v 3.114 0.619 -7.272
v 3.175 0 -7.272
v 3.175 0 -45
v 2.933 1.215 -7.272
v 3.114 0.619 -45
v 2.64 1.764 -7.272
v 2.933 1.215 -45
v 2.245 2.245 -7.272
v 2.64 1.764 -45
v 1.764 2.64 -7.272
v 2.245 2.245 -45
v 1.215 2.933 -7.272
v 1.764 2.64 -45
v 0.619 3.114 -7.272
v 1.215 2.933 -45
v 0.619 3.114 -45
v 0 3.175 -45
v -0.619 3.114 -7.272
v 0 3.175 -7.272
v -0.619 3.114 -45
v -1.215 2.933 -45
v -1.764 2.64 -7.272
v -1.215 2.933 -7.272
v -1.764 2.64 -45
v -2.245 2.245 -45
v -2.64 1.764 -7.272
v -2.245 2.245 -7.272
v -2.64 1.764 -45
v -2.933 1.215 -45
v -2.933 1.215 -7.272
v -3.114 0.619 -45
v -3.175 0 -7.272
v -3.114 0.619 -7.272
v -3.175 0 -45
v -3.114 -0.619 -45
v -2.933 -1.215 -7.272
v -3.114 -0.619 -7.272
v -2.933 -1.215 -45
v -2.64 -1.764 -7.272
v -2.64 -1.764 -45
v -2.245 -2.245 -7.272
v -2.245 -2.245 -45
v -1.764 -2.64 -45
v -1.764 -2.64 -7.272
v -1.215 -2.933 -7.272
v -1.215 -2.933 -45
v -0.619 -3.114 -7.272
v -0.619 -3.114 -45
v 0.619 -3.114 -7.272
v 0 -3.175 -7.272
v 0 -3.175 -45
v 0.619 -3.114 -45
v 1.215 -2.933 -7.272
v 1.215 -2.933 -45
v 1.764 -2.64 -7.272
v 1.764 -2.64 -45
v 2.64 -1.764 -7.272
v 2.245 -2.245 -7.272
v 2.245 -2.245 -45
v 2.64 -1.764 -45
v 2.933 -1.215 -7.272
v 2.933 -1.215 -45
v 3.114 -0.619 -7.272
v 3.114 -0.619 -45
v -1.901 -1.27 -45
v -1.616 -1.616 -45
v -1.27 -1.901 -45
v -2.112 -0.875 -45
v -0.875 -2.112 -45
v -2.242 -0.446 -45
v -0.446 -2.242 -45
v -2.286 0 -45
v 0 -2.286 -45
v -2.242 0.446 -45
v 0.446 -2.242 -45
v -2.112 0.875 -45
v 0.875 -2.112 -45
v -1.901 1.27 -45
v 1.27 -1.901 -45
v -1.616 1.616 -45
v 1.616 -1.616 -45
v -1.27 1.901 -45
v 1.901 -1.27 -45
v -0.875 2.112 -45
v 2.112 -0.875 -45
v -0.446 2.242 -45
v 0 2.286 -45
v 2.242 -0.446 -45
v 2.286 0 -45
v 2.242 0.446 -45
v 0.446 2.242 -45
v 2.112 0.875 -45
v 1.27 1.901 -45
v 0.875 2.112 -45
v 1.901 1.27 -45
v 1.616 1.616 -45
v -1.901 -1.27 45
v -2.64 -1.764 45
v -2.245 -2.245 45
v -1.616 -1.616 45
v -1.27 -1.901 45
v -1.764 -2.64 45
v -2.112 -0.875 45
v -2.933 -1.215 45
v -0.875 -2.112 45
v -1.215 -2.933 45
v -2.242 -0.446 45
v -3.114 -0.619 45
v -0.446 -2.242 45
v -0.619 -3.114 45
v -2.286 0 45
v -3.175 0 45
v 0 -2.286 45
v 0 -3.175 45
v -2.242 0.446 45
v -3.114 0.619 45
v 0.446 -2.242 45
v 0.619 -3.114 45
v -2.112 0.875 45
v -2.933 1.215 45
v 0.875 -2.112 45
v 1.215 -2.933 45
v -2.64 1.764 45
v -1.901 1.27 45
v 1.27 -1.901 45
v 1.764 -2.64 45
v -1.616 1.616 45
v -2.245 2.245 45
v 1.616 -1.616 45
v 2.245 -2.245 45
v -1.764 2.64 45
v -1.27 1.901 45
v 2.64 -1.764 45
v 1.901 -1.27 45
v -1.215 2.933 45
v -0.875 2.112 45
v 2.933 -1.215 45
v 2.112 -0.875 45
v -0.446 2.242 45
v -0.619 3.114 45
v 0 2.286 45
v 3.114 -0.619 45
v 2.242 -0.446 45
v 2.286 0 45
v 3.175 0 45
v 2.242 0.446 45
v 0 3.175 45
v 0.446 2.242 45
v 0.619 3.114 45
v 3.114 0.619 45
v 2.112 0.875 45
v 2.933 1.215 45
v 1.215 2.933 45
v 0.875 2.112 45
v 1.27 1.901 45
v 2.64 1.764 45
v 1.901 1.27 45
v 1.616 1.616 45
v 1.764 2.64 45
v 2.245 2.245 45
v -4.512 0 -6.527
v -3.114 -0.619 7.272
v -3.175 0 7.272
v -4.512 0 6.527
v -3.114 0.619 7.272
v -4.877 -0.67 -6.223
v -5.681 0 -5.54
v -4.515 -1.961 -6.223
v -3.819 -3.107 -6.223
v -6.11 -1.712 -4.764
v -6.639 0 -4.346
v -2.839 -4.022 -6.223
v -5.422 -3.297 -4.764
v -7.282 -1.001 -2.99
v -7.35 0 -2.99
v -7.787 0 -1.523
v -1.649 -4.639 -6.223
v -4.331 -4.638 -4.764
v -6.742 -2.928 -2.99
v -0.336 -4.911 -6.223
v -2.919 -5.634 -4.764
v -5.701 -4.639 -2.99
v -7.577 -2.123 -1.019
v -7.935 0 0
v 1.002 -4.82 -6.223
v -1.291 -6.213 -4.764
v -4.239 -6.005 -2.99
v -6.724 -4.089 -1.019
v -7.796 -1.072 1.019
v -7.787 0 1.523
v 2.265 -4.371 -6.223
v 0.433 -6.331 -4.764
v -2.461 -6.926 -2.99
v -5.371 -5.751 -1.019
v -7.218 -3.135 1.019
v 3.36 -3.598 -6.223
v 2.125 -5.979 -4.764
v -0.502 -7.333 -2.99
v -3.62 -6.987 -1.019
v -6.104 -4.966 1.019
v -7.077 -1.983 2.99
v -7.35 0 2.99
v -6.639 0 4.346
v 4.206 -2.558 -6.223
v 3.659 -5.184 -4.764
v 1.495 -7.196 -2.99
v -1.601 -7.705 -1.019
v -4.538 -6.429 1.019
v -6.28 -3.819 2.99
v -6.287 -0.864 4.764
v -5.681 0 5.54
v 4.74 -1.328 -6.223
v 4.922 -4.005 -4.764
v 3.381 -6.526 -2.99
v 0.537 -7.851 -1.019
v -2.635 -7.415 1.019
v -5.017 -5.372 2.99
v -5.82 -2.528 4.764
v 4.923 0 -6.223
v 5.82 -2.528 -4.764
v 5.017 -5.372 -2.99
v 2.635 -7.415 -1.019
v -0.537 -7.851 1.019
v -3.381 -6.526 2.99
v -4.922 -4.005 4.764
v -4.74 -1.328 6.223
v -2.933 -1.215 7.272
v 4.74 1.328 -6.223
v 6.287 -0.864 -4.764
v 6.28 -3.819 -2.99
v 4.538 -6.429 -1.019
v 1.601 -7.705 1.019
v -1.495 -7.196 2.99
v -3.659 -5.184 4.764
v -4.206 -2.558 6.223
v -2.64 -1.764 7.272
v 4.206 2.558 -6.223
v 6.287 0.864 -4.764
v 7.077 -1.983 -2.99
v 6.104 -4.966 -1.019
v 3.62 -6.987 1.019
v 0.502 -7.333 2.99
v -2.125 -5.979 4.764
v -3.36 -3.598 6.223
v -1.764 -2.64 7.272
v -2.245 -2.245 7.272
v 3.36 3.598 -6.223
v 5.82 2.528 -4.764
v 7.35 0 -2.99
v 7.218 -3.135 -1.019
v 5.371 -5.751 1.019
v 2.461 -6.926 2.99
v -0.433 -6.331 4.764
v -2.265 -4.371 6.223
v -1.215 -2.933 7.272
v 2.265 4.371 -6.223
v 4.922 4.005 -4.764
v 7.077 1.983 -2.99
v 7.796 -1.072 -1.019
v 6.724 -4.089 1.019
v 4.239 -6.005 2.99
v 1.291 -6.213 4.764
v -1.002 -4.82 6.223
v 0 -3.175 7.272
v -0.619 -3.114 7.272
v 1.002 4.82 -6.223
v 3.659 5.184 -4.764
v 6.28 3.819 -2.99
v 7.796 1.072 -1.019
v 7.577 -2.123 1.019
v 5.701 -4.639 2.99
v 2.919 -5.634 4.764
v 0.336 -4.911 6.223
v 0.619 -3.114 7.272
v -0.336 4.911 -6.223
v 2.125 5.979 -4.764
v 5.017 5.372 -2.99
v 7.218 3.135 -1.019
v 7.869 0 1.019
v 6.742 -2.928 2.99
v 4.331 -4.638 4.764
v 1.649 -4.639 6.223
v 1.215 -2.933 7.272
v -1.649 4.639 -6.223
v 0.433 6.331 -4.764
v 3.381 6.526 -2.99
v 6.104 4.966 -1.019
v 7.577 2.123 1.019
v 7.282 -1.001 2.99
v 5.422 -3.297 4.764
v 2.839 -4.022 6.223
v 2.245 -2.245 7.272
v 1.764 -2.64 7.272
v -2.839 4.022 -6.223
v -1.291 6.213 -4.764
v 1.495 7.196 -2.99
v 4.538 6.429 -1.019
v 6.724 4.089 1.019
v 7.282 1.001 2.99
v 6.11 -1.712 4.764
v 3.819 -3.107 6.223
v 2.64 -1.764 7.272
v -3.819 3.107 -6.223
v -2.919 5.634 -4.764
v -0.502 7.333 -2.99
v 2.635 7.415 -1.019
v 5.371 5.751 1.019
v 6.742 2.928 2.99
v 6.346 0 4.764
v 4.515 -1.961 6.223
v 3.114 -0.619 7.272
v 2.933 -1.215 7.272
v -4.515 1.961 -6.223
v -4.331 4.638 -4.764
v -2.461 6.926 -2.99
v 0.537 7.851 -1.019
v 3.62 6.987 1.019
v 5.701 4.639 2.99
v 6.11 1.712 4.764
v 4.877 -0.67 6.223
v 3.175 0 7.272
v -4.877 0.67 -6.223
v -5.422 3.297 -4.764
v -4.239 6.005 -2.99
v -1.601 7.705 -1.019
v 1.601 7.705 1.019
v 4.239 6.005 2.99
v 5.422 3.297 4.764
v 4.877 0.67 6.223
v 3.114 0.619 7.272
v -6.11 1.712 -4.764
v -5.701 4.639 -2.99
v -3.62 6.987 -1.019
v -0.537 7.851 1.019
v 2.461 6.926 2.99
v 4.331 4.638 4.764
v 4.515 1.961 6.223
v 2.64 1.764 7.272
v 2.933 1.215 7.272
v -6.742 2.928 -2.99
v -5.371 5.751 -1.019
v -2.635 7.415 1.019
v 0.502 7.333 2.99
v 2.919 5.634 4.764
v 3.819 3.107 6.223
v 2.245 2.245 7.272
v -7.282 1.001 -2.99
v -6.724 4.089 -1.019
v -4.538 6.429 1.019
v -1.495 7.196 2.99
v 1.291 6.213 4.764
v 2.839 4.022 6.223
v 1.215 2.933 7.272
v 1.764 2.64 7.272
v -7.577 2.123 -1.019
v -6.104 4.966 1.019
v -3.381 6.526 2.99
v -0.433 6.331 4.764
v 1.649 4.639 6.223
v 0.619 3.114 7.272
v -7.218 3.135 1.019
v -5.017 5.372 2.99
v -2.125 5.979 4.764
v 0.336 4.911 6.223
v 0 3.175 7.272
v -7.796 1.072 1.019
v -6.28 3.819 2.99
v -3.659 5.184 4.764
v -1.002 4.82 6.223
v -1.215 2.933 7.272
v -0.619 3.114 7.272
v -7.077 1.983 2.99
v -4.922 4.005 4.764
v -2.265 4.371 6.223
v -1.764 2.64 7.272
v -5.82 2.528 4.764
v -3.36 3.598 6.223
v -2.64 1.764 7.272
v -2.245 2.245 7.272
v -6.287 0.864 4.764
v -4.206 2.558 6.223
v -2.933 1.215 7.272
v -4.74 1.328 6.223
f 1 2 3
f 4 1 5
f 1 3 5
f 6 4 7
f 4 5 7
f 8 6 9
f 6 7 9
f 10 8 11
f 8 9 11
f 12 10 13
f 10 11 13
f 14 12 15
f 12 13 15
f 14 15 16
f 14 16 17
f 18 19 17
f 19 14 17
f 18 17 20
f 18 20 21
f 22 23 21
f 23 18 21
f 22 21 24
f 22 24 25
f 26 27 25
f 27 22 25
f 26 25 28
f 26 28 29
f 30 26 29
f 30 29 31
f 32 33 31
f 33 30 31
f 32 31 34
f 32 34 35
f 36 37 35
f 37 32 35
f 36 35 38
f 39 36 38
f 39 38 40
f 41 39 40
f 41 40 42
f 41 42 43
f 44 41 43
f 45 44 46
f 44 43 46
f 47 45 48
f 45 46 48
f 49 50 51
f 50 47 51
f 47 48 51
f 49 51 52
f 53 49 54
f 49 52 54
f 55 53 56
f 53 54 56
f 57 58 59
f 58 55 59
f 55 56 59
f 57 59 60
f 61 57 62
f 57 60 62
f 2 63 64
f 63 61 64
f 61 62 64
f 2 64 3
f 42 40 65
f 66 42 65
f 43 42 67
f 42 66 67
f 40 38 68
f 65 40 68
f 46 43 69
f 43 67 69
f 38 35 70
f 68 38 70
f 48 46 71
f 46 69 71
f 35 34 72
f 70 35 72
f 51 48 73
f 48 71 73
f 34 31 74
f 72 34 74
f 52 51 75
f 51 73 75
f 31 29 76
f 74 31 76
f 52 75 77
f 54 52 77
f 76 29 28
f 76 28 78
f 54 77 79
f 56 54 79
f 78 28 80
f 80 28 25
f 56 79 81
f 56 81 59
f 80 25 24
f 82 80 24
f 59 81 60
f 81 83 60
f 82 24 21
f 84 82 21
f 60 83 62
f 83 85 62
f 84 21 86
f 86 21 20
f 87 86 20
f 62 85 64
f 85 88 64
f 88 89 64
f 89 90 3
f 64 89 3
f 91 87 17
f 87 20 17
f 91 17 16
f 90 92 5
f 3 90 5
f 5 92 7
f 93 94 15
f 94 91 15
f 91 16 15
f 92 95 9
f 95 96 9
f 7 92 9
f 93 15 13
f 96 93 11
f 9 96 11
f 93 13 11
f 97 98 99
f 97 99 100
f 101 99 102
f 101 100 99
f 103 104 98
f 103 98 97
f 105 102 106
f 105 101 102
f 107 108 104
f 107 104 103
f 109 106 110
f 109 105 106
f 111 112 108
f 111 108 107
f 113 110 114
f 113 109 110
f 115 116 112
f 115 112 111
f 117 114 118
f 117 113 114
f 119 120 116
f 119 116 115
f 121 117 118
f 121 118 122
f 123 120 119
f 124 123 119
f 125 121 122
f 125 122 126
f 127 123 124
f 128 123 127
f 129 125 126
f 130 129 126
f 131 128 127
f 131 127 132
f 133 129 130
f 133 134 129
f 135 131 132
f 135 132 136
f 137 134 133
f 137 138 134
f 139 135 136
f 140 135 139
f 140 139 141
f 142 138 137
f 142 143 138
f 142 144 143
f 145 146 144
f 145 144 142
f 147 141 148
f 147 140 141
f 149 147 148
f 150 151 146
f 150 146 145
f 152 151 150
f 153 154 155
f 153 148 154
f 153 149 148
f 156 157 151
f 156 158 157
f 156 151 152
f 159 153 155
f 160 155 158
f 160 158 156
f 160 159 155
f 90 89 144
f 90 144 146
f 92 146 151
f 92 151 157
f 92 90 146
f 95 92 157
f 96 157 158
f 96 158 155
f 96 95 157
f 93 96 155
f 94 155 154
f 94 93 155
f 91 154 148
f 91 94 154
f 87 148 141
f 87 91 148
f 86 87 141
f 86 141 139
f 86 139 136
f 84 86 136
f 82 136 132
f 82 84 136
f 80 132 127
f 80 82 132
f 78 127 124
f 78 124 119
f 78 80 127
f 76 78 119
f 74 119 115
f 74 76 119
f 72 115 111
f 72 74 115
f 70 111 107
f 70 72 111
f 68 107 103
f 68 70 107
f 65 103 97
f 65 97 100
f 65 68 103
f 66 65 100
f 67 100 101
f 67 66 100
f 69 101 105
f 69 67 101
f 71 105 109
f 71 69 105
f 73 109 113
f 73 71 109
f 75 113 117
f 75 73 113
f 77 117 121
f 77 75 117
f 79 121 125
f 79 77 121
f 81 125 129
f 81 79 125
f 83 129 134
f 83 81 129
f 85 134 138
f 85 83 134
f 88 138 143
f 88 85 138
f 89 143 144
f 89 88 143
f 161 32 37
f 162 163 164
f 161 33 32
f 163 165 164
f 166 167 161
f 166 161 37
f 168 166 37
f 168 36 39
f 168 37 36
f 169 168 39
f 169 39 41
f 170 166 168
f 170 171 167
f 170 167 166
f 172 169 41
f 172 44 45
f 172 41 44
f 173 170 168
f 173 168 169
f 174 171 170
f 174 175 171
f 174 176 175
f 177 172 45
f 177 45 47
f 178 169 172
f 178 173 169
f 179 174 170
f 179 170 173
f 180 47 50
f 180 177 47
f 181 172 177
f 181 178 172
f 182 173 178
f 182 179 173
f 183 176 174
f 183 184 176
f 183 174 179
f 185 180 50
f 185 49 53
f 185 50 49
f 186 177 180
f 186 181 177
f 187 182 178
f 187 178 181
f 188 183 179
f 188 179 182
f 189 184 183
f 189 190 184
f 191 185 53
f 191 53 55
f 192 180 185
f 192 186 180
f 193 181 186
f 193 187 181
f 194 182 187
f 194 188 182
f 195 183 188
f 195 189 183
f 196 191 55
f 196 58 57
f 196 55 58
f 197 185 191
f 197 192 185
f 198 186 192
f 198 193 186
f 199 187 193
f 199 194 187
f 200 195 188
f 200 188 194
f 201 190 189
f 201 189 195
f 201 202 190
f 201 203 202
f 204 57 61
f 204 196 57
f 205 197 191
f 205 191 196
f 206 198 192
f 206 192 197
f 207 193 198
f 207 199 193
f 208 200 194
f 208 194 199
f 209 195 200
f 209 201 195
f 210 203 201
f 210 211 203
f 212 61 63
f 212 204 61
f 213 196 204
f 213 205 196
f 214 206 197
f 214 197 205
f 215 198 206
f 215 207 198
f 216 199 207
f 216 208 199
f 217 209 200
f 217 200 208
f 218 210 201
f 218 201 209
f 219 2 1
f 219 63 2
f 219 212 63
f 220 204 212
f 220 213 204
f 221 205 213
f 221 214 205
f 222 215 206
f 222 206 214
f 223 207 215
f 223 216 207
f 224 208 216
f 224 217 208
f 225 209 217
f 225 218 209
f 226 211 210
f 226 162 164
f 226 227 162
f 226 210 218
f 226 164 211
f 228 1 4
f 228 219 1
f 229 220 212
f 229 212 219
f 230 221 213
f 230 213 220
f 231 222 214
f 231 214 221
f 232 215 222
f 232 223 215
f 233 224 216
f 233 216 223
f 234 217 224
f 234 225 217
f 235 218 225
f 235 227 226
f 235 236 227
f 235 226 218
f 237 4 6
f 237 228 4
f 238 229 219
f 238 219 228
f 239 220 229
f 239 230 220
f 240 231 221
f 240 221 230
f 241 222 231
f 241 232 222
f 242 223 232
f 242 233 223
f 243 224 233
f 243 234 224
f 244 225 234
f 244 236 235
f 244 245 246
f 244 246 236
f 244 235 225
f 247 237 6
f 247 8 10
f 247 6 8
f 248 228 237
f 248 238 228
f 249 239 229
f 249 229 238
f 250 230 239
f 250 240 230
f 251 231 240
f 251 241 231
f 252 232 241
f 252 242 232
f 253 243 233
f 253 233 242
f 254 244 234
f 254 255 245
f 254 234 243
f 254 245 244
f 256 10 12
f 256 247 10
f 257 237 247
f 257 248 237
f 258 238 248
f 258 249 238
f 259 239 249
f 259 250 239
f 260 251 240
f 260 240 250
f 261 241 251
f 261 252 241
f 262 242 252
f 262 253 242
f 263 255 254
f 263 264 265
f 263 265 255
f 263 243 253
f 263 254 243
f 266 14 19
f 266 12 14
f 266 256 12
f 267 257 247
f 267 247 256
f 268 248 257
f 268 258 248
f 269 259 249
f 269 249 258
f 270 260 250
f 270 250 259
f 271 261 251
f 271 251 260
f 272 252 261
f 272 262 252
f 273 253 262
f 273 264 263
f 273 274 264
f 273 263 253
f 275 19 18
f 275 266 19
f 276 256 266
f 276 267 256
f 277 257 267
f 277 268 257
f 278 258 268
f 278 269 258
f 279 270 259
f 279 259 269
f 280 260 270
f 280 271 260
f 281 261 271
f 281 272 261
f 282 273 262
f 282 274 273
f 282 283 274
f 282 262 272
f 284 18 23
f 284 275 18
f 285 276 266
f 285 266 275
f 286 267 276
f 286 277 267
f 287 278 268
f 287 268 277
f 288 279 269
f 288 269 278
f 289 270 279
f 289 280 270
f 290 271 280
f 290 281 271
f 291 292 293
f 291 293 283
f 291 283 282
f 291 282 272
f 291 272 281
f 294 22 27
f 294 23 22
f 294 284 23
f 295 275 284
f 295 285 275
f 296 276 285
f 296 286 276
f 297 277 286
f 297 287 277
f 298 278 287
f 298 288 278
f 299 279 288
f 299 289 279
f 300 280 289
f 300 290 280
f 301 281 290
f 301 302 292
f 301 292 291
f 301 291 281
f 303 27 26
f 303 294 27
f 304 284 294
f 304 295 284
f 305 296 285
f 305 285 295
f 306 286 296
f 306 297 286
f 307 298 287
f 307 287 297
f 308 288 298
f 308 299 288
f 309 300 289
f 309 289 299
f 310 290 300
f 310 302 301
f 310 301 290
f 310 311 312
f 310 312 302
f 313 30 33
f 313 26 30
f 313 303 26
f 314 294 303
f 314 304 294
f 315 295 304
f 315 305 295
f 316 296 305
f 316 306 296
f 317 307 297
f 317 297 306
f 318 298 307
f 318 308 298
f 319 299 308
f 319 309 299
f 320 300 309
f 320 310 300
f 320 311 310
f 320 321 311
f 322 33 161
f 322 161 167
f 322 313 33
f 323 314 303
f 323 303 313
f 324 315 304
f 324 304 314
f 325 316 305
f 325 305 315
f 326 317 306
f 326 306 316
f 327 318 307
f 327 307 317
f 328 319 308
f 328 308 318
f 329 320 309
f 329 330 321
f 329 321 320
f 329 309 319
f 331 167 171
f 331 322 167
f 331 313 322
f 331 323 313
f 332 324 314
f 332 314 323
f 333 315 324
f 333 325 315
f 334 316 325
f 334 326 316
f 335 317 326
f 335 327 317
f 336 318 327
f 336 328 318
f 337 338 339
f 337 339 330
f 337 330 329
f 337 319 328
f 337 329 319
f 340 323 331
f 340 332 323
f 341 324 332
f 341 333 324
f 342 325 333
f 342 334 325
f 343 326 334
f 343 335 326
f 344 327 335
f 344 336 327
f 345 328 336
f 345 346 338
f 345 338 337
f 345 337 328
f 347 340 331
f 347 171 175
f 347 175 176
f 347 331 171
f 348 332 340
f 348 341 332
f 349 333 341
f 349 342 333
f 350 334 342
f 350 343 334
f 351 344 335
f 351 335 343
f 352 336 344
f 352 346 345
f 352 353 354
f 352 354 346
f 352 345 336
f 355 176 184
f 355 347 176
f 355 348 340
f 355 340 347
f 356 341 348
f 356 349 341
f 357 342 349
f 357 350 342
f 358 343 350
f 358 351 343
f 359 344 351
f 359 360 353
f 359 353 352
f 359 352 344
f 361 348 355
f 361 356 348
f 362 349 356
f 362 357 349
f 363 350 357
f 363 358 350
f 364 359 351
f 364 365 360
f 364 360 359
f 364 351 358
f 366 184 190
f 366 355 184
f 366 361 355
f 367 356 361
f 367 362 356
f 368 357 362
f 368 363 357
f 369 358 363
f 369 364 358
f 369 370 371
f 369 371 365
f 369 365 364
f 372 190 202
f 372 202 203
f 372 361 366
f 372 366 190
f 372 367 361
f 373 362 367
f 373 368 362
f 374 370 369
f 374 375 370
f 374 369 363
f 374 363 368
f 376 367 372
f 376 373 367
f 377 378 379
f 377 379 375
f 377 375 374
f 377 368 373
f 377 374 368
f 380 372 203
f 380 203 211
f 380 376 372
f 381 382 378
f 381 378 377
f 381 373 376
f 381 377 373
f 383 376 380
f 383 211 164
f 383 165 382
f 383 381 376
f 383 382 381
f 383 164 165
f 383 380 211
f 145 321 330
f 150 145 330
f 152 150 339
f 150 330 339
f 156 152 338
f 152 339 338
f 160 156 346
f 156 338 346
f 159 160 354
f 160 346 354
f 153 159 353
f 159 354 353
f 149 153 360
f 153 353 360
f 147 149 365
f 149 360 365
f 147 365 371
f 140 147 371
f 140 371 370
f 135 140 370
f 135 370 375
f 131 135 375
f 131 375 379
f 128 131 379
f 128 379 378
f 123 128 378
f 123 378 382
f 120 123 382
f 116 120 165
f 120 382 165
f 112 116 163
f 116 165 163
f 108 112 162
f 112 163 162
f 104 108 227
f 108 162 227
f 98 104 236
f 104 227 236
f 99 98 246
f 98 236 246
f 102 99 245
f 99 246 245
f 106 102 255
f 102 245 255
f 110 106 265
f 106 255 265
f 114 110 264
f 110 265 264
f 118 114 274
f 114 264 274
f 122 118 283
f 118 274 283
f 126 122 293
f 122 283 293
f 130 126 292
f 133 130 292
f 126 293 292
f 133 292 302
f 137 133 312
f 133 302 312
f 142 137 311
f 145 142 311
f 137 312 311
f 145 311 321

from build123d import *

# Parameters (mm, degrees)
CUT_EXTRUDE1_DEPTH       = 14.743823158
CUT_EXTRUDE1_DEPTH_BACK  = 14.743823158
SKETCH4_R                = 3.175
BOSS_EXTRUDE1_DEPTH      = 45
BOSS_EXTRUDE1_DEPTH_BACK = 45
SKETCH5_R                = 3.175
SKETCH5_R_2              = 2.286


with BuildPart() as part:
    # Sketch3 → Revolve3 (revolve)
    with BuildSketch(Plane(origin=(0, 0, 0), x_dir=(1, 0, 0), z_dir=(0, 1, 0))):
        with BuildLine():
            Line((0, -7.935), (0, 7.935))
            ThreePointArc((0, 7.935), (-7.935, 0), (0, -7.935))
        make_face()
    revolve(axis=Axis((0, 0, -12.438098035), (0, 0, 1)))

    # Sketch4 → Cut-Extrude1 (cut, two sides: drawn at the far end of the back side and taken through both)
    with BuildSketch(Plane.XY.offset(-CUT_EXTRUDE1_DEPTH_BACK)):
        Circle(SKETCH4_R)
    extrude(amount=CUT_EXTRUDE1_DEPTH + CUT_EXTRUDE1_DEPTH_BACK, mode=Mode.SUBTRACT)

    # Sketch5 → Boss-Extrude1 (add, two sides: drawn at the far end of the back side and taken through both)
    with BuildSketch(Plane.XY.offset(-BOSS_EXTRUDE1_DEPTH_BACK)):
        Circle(SKETCH5_R)
        Circle(SKETCH5_R_2, mode=Mode.SUBTRACT)
    extrude(amount=BOSS_EXTRUDE1_DEPTH + BOSS_EXTRUDE1_DEPTH_BACK)


solid = part.part
